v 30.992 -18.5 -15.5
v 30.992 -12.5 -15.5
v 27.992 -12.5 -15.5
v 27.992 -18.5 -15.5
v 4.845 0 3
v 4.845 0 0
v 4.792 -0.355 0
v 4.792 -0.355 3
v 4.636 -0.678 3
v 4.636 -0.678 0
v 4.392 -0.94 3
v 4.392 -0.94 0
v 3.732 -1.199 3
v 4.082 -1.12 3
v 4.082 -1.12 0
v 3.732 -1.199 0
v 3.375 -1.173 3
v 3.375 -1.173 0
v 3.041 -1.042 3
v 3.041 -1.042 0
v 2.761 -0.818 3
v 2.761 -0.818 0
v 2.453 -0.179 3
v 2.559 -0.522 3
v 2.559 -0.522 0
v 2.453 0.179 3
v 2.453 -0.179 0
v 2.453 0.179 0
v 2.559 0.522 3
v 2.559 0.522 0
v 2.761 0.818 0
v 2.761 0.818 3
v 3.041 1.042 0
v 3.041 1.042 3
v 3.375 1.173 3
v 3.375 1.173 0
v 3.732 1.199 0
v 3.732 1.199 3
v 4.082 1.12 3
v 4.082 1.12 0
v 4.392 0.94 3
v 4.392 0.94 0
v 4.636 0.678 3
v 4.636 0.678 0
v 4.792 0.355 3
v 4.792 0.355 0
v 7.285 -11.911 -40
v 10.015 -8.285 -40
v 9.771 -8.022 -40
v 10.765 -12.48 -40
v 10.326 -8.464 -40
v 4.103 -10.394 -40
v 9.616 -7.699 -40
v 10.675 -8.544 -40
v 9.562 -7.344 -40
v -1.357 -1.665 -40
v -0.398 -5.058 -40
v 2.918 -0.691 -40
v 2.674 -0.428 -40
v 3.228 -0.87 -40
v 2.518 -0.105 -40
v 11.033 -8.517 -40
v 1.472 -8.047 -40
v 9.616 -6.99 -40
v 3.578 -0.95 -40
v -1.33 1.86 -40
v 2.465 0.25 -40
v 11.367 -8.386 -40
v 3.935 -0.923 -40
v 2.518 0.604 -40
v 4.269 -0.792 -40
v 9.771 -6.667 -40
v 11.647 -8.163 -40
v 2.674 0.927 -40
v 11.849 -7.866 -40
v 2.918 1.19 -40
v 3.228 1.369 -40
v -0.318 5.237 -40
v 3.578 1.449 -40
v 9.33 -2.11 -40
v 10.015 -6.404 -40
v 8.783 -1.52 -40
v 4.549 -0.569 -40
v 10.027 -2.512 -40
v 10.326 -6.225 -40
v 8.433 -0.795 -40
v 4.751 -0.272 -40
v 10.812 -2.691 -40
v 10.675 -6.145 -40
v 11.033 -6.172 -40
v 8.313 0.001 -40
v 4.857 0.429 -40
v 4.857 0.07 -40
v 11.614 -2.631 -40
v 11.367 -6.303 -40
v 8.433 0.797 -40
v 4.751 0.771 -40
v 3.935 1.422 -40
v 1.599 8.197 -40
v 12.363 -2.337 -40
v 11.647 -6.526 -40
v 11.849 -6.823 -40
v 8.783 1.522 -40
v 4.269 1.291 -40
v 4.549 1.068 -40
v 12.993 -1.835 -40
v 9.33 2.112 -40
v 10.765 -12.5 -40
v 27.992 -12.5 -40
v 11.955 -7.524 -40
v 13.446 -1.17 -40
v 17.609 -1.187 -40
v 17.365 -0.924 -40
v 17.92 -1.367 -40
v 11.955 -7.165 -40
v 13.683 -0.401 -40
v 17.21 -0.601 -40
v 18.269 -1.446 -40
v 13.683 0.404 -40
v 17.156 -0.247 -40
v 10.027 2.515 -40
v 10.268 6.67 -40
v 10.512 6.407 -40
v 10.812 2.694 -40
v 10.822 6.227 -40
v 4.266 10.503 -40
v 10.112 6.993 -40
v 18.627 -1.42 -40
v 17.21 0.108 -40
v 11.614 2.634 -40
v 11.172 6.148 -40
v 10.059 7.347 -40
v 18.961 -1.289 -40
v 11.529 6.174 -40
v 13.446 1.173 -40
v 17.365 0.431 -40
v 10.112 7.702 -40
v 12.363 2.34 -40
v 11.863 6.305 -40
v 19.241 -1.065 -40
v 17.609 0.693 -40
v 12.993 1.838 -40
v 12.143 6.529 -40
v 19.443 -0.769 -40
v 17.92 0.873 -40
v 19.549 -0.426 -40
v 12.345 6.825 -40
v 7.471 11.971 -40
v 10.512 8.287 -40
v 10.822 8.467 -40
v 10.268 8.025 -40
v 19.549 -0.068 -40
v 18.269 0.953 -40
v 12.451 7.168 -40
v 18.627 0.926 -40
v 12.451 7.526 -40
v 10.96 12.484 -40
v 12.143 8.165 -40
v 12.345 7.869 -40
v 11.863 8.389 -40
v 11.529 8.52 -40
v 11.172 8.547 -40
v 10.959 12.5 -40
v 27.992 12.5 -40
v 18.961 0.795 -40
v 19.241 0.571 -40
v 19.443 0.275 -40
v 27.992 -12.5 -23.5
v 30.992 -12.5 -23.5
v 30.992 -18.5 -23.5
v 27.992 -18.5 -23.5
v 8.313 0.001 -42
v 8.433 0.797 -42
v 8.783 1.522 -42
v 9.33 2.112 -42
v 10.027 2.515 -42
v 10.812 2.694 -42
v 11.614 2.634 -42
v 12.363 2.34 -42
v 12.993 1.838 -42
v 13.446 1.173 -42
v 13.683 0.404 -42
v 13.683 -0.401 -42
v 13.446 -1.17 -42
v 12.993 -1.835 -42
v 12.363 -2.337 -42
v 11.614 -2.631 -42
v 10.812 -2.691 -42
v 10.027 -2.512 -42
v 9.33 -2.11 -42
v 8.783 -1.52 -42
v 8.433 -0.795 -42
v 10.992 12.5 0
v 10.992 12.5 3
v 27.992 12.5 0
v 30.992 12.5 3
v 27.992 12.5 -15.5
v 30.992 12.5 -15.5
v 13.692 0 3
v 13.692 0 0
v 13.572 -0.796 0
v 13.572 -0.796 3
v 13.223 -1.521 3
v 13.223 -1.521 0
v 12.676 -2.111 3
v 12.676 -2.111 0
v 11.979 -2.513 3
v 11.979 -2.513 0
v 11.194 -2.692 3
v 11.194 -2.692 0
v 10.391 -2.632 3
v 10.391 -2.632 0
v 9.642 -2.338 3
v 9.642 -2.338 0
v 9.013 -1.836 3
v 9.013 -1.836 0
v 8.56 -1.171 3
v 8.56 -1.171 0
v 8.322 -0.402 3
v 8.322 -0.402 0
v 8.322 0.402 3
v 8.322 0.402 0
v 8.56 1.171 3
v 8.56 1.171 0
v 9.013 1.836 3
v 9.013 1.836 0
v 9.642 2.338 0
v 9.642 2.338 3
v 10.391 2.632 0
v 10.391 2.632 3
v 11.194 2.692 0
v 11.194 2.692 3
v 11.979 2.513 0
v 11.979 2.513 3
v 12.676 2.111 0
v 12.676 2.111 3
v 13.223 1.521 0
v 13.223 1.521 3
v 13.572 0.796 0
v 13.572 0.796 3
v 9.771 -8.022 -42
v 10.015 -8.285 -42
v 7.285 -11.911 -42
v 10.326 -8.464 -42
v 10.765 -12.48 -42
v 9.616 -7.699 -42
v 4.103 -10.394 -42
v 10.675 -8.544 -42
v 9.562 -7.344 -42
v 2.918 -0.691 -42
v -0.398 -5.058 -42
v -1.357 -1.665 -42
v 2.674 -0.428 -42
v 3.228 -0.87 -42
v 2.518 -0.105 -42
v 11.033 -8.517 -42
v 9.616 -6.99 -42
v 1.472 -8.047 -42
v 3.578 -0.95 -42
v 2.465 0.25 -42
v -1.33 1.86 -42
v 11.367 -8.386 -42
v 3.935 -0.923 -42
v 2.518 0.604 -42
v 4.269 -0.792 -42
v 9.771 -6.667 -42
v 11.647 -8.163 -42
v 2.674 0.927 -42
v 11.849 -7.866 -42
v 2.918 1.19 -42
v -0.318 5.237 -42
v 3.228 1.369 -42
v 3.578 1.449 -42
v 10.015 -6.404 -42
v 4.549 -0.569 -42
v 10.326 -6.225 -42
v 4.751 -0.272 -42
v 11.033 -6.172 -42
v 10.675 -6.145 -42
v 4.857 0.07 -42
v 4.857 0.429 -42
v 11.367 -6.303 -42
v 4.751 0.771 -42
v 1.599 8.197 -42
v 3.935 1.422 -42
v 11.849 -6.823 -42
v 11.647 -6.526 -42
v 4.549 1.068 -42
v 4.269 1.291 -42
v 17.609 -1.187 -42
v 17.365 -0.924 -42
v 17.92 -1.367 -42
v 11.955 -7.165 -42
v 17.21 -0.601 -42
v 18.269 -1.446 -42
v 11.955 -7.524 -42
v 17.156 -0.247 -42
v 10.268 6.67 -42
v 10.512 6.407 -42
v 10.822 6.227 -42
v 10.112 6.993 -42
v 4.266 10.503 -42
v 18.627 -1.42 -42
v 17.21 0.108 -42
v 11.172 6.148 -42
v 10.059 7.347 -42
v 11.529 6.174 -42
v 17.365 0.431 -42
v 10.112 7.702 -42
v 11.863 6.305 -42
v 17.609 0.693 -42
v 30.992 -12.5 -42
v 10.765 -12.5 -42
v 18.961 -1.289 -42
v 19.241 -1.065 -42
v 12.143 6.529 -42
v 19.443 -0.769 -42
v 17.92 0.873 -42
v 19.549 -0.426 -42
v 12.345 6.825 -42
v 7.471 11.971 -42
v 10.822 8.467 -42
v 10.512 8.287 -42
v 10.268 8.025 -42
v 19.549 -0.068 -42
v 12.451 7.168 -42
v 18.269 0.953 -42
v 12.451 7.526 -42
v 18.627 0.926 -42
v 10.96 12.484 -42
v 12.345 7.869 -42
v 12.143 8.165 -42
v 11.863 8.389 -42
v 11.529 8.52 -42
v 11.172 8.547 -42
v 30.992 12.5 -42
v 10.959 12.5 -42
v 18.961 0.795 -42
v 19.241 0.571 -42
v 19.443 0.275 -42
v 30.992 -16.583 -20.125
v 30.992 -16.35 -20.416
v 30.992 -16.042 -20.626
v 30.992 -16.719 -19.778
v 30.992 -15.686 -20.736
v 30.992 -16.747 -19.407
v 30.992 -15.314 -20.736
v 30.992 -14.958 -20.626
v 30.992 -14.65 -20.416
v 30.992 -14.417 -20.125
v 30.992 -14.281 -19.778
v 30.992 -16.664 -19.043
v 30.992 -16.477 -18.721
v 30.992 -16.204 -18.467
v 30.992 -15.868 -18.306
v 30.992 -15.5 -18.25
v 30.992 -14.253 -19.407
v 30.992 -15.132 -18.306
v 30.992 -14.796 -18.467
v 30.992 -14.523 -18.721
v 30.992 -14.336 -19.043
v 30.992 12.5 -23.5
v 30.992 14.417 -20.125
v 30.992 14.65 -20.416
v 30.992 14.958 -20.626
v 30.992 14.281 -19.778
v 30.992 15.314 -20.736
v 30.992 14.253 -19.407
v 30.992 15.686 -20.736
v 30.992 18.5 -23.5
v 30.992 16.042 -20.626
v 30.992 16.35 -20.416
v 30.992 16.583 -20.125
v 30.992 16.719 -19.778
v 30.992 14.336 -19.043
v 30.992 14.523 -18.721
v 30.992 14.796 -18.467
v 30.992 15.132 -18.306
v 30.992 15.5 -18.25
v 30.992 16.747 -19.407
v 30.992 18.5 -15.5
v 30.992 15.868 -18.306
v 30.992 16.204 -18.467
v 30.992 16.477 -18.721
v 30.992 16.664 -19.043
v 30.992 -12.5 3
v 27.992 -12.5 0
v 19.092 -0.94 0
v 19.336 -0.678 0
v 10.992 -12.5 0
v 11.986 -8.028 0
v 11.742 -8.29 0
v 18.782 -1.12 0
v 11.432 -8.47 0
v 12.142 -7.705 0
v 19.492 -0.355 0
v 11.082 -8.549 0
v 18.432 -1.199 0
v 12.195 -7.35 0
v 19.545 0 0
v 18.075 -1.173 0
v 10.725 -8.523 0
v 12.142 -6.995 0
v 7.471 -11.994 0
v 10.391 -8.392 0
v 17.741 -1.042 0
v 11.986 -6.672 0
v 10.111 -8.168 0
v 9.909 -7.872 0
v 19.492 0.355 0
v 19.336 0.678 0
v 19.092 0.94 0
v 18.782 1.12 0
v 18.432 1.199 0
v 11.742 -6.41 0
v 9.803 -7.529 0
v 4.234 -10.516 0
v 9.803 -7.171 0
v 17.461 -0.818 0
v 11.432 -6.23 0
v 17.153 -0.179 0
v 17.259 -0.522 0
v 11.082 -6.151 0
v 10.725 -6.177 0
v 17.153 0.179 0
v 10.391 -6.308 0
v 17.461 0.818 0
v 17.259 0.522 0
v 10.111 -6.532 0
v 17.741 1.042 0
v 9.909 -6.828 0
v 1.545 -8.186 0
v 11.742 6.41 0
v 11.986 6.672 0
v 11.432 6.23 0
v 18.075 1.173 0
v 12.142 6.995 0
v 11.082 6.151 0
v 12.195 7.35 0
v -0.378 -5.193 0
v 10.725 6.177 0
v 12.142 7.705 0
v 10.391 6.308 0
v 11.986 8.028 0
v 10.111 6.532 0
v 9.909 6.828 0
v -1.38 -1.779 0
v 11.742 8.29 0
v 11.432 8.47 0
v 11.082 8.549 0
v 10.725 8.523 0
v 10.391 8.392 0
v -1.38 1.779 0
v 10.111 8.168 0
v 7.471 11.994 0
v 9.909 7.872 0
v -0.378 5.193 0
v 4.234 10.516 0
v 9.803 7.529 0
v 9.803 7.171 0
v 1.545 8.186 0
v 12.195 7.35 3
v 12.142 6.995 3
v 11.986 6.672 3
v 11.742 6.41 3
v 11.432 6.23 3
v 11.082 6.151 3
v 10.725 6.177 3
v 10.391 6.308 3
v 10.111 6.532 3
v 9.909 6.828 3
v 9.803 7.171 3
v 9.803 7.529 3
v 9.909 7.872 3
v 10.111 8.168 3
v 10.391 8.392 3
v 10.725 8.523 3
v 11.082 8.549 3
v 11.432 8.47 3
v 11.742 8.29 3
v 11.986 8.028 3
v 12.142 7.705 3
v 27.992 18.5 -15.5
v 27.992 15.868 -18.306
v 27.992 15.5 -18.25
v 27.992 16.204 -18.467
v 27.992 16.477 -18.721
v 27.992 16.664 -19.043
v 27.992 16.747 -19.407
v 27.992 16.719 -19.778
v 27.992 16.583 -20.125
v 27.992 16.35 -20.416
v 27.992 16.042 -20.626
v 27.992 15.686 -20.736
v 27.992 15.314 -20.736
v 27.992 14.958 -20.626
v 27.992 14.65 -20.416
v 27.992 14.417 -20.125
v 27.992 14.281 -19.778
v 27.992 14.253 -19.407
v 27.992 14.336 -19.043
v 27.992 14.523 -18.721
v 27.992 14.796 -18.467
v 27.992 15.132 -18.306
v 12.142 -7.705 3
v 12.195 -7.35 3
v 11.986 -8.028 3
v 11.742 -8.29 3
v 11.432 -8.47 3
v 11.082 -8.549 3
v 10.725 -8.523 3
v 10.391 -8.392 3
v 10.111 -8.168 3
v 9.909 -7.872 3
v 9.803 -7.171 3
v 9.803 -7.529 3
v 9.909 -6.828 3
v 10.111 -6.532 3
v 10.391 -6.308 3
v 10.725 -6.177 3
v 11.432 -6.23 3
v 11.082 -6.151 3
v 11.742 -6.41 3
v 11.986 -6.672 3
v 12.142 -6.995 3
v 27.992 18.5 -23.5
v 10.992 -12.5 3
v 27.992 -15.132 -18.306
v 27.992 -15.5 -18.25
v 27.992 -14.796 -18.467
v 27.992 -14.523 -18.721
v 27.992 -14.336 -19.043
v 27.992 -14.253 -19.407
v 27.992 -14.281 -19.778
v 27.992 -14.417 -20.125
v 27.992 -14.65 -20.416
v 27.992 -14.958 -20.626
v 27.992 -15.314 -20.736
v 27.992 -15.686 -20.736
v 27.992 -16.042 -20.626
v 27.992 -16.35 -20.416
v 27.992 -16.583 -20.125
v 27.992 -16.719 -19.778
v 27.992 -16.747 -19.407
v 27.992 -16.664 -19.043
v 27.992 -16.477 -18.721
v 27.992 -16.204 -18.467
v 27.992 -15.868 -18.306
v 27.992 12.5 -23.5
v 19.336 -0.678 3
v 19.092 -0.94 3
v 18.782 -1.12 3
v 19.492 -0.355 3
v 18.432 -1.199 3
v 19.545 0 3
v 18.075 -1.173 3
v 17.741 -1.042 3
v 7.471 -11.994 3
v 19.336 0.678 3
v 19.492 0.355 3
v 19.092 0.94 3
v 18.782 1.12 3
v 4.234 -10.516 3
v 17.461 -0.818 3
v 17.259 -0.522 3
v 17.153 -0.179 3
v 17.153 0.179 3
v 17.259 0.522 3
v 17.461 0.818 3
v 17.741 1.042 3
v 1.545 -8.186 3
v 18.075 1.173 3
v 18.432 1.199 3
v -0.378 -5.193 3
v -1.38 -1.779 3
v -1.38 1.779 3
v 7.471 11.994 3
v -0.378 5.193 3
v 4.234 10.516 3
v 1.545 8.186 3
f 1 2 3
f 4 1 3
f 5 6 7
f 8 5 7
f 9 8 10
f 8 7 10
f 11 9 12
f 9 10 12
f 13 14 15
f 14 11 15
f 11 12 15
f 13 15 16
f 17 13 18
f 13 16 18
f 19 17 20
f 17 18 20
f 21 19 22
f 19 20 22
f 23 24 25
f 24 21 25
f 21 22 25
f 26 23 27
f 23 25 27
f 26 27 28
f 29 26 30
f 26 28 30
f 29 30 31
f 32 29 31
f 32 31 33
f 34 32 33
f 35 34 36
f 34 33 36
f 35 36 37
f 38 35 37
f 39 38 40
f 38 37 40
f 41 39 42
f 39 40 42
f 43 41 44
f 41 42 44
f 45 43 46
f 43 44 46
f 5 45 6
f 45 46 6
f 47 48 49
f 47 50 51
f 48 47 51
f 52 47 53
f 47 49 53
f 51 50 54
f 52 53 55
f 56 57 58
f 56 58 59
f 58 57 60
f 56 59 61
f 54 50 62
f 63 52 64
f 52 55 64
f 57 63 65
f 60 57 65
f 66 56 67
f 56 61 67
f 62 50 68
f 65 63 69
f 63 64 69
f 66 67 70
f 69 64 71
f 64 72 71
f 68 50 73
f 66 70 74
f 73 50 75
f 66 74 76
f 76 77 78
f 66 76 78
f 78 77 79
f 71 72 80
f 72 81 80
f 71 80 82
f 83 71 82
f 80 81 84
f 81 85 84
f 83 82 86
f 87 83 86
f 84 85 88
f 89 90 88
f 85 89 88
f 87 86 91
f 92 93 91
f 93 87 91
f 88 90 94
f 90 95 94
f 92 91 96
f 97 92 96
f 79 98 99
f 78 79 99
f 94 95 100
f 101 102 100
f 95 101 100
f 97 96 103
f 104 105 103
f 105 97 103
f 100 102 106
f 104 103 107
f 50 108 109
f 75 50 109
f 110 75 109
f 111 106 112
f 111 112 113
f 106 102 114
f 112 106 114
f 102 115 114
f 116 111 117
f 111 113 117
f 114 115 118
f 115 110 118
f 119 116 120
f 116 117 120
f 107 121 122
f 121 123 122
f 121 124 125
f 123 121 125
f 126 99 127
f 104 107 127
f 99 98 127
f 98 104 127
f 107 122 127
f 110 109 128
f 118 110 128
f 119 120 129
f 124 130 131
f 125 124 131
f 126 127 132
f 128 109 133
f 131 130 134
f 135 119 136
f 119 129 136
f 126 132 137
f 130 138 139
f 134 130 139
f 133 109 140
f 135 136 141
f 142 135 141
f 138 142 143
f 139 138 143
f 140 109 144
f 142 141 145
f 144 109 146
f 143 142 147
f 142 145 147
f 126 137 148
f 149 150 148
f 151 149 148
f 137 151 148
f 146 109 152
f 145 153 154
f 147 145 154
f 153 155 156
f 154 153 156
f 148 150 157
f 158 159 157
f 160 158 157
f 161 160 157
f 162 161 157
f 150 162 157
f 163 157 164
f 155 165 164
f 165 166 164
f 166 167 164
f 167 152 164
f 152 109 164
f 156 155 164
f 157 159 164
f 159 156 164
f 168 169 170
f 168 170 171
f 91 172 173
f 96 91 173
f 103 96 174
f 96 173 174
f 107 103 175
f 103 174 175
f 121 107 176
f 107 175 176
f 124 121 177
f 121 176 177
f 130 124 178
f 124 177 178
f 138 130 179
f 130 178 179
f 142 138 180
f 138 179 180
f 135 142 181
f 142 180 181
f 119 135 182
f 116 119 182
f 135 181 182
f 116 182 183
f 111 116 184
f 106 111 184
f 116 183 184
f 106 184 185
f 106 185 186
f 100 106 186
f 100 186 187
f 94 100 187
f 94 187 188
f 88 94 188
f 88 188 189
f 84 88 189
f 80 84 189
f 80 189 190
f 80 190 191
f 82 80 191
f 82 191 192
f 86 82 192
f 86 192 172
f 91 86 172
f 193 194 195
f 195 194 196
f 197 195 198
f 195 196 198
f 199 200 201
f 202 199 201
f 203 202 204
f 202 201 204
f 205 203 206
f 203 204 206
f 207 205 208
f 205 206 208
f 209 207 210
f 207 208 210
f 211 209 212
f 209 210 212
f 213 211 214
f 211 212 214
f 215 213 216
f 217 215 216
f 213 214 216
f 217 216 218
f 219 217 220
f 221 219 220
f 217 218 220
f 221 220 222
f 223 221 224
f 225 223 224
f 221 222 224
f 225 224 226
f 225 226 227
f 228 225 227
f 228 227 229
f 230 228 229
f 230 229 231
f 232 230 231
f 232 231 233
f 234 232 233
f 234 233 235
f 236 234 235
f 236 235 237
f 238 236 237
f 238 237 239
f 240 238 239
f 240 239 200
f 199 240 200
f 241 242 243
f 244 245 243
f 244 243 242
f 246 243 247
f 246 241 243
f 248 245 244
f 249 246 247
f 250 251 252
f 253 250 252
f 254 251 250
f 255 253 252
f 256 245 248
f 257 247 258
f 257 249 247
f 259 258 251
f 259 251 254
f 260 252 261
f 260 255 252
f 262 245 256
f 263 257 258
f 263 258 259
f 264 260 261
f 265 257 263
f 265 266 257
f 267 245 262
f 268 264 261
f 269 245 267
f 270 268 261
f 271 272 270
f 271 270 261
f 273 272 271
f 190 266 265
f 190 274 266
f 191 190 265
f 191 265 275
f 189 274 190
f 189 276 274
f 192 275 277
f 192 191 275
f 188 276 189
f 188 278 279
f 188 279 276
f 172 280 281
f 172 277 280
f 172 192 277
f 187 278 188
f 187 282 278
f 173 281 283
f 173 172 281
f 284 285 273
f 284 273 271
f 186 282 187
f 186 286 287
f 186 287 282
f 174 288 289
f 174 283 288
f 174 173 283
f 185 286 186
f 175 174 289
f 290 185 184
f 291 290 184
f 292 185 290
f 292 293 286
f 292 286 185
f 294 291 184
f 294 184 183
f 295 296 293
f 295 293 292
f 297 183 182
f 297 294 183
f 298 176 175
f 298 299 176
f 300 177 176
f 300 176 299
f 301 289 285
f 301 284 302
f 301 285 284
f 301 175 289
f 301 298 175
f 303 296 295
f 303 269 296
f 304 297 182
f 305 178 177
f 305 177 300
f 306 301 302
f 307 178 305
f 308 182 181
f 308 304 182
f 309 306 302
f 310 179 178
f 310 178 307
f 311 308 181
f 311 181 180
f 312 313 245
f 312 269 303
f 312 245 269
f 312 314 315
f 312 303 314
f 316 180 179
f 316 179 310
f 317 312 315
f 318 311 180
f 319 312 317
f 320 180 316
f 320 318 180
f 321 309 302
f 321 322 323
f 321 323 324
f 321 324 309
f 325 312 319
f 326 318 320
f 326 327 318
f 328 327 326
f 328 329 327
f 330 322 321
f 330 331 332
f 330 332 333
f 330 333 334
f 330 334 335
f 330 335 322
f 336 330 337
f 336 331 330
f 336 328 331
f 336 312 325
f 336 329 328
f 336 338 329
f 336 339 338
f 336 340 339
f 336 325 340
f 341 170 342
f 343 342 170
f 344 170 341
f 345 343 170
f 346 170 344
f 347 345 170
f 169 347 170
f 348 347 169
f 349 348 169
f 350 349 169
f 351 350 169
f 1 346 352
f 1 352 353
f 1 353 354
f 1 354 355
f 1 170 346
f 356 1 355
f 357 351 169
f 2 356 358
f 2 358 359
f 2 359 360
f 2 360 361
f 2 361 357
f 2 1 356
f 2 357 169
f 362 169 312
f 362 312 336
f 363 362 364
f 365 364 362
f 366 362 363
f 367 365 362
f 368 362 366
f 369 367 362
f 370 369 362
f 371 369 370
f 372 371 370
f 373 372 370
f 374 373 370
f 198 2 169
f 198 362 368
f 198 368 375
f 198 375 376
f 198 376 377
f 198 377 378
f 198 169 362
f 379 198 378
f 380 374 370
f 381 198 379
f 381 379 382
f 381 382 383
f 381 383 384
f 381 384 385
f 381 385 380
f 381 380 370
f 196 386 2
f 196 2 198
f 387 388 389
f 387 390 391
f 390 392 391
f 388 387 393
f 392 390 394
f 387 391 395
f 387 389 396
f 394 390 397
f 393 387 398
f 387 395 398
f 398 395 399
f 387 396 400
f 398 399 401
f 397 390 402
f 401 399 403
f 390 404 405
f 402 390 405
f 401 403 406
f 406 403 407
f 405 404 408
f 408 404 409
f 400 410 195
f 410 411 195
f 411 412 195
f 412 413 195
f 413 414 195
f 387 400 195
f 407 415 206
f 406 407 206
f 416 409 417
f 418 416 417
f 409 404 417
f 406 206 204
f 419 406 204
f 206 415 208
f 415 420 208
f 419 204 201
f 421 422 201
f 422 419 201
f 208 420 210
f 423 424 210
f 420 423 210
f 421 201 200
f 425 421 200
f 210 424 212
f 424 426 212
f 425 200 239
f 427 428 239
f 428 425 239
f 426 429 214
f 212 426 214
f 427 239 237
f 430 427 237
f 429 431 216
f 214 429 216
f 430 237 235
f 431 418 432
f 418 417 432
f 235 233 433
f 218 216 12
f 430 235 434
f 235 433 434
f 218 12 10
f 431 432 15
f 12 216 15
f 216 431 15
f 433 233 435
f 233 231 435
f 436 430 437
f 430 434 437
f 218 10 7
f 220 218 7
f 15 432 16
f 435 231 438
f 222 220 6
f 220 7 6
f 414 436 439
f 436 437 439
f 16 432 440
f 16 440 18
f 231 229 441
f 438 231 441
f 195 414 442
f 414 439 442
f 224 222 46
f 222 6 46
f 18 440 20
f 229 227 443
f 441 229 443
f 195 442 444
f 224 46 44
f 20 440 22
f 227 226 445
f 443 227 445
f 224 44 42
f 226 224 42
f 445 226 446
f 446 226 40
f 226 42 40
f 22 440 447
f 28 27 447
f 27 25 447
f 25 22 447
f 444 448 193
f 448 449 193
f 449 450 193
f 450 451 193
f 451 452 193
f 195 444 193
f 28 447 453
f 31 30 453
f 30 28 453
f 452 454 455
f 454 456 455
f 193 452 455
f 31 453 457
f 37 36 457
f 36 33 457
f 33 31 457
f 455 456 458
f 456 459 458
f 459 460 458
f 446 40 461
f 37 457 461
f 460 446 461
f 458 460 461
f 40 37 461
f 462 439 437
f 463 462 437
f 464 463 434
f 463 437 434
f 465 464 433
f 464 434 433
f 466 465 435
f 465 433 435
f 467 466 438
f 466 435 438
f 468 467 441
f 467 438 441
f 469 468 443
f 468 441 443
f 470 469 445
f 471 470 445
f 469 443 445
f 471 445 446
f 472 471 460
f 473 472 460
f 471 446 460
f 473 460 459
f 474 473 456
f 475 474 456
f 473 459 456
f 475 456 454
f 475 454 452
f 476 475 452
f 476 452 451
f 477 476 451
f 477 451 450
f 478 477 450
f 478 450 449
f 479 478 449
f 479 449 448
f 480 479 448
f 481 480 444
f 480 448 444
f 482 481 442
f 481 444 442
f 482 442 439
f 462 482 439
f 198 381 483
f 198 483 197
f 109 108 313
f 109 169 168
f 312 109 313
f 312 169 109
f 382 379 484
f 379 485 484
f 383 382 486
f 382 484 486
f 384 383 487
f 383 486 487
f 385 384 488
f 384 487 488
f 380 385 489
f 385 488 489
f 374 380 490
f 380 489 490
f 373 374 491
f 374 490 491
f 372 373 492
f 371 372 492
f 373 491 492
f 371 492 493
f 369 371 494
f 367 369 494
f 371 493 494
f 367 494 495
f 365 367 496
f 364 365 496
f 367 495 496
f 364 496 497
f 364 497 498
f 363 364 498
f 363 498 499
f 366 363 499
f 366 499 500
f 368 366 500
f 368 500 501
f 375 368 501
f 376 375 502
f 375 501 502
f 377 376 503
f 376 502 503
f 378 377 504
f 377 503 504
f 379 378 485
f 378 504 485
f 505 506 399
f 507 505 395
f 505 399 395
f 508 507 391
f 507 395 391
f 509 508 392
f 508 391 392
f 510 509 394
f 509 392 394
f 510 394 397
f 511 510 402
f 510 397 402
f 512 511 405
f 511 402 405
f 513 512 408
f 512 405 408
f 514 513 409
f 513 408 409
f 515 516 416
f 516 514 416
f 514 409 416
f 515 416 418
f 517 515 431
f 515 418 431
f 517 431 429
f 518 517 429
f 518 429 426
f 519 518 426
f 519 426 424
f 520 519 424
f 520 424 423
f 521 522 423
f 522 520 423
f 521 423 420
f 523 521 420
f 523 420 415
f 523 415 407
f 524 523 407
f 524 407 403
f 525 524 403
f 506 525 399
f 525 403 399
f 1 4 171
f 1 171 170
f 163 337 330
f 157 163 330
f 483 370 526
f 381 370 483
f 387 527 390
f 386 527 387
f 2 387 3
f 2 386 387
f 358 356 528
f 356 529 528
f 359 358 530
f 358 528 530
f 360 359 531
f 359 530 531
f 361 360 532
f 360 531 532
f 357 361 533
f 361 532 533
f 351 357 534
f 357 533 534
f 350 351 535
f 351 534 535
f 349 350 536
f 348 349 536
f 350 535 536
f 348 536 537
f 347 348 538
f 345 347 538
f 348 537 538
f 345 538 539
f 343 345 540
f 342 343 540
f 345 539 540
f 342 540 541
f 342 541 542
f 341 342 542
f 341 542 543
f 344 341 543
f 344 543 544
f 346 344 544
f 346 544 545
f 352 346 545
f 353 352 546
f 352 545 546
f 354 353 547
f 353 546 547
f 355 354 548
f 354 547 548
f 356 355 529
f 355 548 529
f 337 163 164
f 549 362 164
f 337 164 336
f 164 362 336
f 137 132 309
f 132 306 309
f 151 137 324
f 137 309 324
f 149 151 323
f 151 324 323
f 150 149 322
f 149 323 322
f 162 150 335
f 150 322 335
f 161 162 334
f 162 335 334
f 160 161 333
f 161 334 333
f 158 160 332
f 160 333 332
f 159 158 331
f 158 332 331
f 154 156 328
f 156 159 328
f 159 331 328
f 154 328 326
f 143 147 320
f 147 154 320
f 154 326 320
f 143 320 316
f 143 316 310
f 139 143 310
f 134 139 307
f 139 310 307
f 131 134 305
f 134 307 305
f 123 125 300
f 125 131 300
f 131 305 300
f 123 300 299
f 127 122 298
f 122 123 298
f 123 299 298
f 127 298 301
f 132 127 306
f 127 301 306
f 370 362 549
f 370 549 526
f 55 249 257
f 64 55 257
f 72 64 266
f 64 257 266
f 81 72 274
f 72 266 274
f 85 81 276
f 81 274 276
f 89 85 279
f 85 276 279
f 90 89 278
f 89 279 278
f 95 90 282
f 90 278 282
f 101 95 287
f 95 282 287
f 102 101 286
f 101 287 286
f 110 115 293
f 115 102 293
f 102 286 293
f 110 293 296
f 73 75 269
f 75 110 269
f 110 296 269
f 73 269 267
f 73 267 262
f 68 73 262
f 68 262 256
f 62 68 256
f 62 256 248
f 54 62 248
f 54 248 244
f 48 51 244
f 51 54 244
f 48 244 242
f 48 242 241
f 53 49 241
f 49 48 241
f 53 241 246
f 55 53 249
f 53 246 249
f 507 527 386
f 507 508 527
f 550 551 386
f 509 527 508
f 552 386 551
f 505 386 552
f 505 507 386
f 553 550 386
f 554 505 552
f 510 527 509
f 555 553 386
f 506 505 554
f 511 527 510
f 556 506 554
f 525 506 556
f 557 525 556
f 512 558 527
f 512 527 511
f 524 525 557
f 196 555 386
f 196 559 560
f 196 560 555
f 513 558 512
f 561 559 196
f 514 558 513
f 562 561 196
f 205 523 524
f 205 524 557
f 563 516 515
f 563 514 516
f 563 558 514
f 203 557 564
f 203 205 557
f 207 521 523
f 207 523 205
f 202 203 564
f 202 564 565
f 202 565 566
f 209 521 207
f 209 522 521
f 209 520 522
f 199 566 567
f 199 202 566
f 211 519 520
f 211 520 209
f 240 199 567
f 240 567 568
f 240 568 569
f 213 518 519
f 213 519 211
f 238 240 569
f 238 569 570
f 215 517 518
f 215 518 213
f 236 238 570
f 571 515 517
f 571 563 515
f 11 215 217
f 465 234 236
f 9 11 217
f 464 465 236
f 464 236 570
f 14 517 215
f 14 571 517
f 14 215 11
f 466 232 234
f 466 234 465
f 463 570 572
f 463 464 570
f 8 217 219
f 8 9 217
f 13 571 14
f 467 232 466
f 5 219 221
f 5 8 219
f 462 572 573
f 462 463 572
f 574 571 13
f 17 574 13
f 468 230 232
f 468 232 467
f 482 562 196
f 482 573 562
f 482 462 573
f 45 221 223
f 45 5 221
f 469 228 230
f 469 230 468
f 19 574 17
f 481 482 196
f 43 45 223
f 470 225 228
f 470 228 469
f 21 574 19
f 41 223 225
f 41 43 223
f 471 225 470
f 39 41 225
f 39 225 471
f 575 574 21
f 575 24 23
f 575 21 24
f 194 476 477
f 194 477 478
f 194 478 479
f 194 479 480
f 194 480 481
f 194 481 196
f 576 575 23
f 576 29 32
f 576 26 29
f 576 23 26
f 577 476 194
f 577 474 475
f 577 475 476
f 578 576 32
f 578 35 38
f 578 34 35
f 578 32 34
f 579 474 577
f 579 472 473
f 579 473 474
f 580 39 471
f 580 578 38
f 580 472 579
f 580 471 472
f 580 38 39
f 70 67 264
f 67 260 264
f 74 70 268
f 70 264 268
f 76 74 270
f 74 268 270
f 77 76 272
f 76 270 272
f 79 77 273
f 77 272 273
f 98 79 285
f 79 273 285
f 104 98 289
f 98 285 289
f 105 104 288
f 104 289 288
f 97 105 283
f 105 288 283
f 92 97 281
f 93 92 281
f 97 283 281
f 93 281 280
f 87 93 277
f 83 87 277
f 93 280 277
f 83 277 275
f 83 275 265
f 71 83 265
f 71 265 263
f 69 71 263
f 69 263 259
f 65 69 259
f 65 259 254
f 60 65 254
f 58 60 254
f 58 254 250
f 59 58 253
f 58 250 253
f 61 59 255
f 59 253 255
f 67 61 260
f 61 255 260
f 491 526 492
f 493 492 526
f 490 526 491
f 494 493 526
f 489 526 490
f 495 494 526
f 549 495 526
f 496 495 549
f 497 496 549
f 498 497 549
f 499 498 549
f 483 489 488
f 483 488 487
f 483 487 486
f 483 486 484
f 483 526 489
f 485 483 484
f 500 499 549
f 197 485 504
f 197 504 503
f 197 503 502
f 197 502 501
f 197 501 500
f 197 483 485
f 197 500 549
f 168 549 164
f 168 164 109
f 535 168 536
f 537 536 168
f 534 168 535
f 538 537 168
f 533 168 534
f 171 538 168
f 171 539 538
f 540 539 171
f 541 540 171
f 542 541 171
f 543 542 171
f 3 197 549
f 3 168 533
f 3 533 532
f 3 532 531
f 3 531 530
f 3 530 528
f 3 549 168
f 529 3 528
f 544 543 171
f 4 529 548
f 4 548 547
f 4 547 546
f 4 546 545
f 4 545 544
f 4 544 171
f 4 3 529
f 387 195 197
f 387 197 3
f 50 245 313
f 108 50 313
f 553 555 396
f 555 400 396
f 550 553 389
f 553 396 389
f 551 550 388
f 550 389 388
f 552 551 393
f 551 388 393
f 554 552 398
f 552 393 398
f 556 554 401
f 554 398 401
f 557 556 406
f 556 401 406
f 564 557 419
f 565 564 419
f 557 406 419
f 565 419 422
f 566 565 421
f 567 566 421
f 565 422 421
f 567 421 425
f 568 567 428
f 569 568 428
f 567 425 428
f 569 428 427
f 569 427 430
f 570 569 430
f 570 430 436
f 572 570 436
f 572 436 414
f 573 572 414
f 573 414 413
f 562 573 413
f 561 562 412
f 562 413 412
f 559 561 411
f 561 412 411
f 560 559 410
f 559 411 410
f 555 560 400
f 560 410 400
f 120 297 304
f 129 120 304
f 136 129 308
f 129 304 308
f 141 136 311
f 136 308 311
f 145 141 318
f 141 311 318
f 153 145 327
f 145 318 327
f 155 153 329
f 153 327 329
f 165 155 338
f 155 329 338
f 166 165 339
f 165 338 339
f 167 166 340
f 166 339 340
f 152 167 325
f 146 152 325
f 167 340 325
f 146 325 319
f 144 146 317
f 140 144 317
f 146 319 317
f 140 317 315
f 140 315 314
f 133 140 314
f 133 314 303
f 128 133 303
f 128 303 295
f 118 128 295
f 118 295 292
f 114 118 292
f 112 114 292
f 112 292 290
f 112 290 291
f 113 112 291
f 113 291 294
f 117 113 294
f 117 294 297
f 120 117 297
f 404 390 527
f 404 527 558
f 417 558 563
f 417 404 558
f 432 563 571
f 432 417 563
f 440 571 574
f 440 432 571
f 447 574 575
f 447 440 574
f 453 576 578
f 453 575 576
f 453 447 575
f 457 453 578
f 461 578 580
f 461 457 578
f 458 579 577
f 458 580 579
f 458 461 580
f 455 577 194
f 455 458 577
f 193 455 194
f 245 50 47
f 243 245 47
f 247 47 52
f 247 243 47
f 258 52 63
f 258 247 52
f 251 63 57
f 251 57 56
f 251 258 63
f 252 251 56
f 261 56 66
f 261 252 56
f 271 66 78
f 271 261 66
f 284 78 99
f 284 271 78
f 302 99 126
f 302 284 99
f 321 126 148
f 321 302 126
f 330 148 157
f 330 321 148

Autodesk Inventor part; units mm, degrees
ref_plane "YZ Plane" through (0, 0, 0) normal (1, 0, 0) x (0, 1, 0)
ref_plane "XZ Plane" through (0, 0, 0) normal (0, 1, 0) x (-1, 0, 0)
ref_plane "XY Plane" through (0, 0, 0) normal (0, 0, 1) x (1, 0, 0)
ref_plane "Plano de trabajo1" through (0, 0, 0) normal (0, 0, 1) x (1, 0, 0)
sketch "Boceto1" plane through (0, 0, 0) normal (0, 0, 1) x (1, 0, 0)
  circle A0 centre (18.3423, 0) radius 1.2028 projected
  circle A1 centre (3.6423, 0) radius 1.2028 projected
  circle A2 centre (10.9923, -7.35) radius 1.2028 projected
  circle A3 centre (10.9923, 7.35) radius 1.2028 projected
  circle A4 centre (10.9923, 0) radius 10.9823 projected
  circle A5 centre (10.9923, 0) radius 2.7 projected
  circle A6 centre (10.9923, 0) radius 12.5
  line L0 (10.9923, 0) -> (22.9923, 0)
  line L1 (10.9923, 0) -> (10.9923, 12.5)
  line L2 (10.9923, 12.5) -> (22.9923, 12.5)
  line L3 (10.9923, 0) -> (10.9923, -12.5)
  line L4 (10.9923, -12.5) -> (22.9923, -12.5)
  line L5 (22.9923, -12.5) -> (22.9923, 12.5)
  point P0 (0, 0)
  dimension "d0" = 25
  dimension "d1" = 12
  dimension "d2" = 12
extrude "Extrusión1" add sketch "Boceto1" along normal blind 3 contours L0 A4 L3 A2 A5 A0 | A0 L0 A5 L1 A3 A4 | L0 L5 A6 L3 A4 | A4 L1 A6 L5 L0 | L1 A3 A5 L3 A2 A4 | A4 L3 A6 L1 | L2 L5 A6 | A6 L5 L4
sketch "Boceto2" plane through (22.9923, -12.5, 0) normal (1, 0, 0) x (0, 0, -1)
  line L0 (0, 0) -> (0, 25) projected
  line L1 (0, 25) -> (-3, 25) projected
  line L2 (-3, 0) -> (-3, 25) projected
  line L3 (0, 0) -> (-3, 0) projected
  point P0 (0, 12.5)
extrude "Extrusión2" add sketch "Boceto2" along normal blind 8
sketch "Boceto3" plane through (0, 0, 0) normal (0, 0, -1) x (-1, 0, 0)
  line L0 (-10.9923, -12.5) -> (-30.9923, -12.5) projected
  arc A0 (-10.9923, -12.5) -> (-10.9923, 12.5) centre (-10.9923, 0) ccw projected
  line L1 (-10.9923, 12.5) -> (-30.9923, 12.5) projected
  line L2 (-30.9923, -12.5) -> (-30.9923, 12.5) projected
  circle A1 centre (-10.9923, 0) radius 2.7 projected
  circle A2 centre (-10.9923, 7.35) radius 1.2028 projected
  circle A3 centre (-18.3423, 0) radius 1.2028 projected
  circle A4 centre (-3.6423, 0) radius 1.2028 projected
  circle A5 centre (-10.9923, -7.35) radius 1.2028 projected
  line L3 (-30.9923, 12.5) -> (-27.9923, 12.5)
  line L4 (-27.9923, 12.5) -> (-27.9923, -12.5)
  line L5 (-27.9923, -12.5) -> (-30.9923, -12.5)
  line L6 (-30.9923, -12.5) -> (-30.9923, 12.5)
  point P0 (0, 0)
  dimension "d7" = 3
extrude "Extrusión3" add sketch "Boceto3" along normal blind 42 contours L0 L2 L1 L4
sketch "Boceto4" plane through (27.9923, -12.5, 0) normal (-1, 0, 0) x (0, 0, 1)
  line L0 (-42, 0) -> (-42, 25) projected
  line L1 (0, 25) -> (0, 0) projected
  line L2 (0, 25) -> (-42, 25) projected
  line L3 (-42, 0) -> (-42, 25) projected
  line L4 (0, 0) -> (-42, 0) projected
  line L5 (-42, 0) -> (-40, 0)
  line L6 (-40, 0) -> (-40, 25)
  line L7 (-40, 25) -> (-42, 25)
  line L8 (-42, 25) -> (-42, 0)
  point P0 (0, 12.5)
  dimension "d10" = 2
extrude "Extrusión4" add sketch "Boceto4" along normal blind 30 contours L0 L2 L6 L4
sketch "Boceto5" plane through (0, 0, -42) normal (0, 0, -1) x (-1, 0, 0)
  line L0 (24.4501, 12.6367) -> (24.5578, -12.3277) projected
  line L1 (-11.0672, 12.4835) -> (24.4501, 12.6367) projected
  arc A0 (-11.0672, 12.4835) -> (-10.9596, -12.4809) centre (-11.0134, 0.0013) ccw projected
  line L2 (-10.9596, -12.4809) -> (24.5578, -12.3277) projected
  circle A1 centre (-3.6676, 0.2495) radius 1.2028 projected
  circle A2 centre (-11.0134, 0.0013) radius 2.7 projected
  circle A3 centre (-10.7652, -7.3445) radius 1.2028 projected
  circle A4 centre (-11.2616, 7.3471) radius 1.2028 projected
  circle A5 centre (-18.3592, -0.2469) radius 1.2028 projected
  line L3 (-30.9923, 12.5) -> (2.0077, 12.5) projected
  line L4 (-11.0672, 12.4835) -> (2.0077, 12.5)
  line L5 (2.0391, -12.4248) -> (2.0077, 12.5)
  line L6 (-10.9596, -12.4809) -> (2.0391, -12.4248)
  line L7 (-11.0672, 12.4835) -> (2.0077, 12.5)
  circle A6 centre (-11.0134, 0.0013) radius 12.4823
  line L8 (-10.7652, -7.3445) -> (-10.7652, -14.8497)
  line L9 (-10.7652, -14.8497) -> (6.2045, -14.8497)
  line L10 (6.2045, -14.8497) -> (6.2045, 15.7882)
  line L11 (6.2045, 15.7882) -> (-10.7652, 15.7882)
  line L12 (-10.7652, 15.7882) -> (-11.2616, 7.3471)
  point P0 (0, 0)
  point P1 (-7.2489, 12.5)
  point P2 (-10.991, 12.4836)
  point P3 (-10.9817, -12.481)
  point P4 (-10.9586, 12.5)
  point P5 (6.2045, 12.558)
  point P6 (6.2045, -12.4069)
  point P7 (-10.7652, -12.48)
  point P8 (-10.9595, 12.484)
  point P9 (-10.9595, 12.4837)
  point P10 (-10.9596, 12.4835)
  point P11 (-10.991, 12.4836)
  point P12 (-10.7652, -12.4785)
  point P13 (-11.0672, 12.4835)
extrude "Extrusión5" cut sketch "Boceto5" against normal blind 25 contours L10 L2 L5 L3 L1 | L1 L3 L12 L11 L10 | L10 L9 L8 L2 | L3 L4 L1 | L1 L12 L3 | L2 A6 L4 L5 | A3 | A4 | A1 | A2 | A5
sketch "Boceto8" plane through (10.9923, -12.5, 0) normal (0, -1, 0) x (1, 0, 0)
  line L0 (-0.2271, -40) -> (-0.2271, -42) projected
  line L1 (20, -42) -> (-0.2271, -42) projected
  line L2 (20, 3) -> (20, -42) projected
  line L3 (0, 3) -> (20, 3) projected
  line L4 (0, 0) -> (0, 3) projected
  line L5 (0, 0) -> (17, 0) projected
  line L6 (17, 0) -> (17, -40) projected
  line L7 (17, -40) -> (-0.2271, -40) projected
  line L8 (20, -42) -> (20, -19.5)
  line L9 (20, 3) -> (20, -42) projected
  line L10 (20, -19.5) -> (20, -23.5)
  line L11 (20, -23.5) -> (20, -15.5)
  line L12 (20, -15.5) -> (17, -15.5)
  line L13 (20, -23.5) -> (17, -23.5)
  point P0 (-10.9923, 0)
  dimension "d29" = 22.5
  dimension "d30" = 4
  dimension "d31" = 8
extrude "Extrusión8" add sketch "Boceto8" along normal blind 6 contours L6 L12 L2 L13
ref_plane "Plano de trabajo2" through (-0.8313, -11.6464, -27.56) normal (0.0048, -1, 0) x (1, 0.0048, 0)
sketch "Boceto9" plane through (30.9923, -12.5, 0) normal (1, 0, 0) x (0, 0, -1)
  line L0 (-3, 25) -> (42, 25) projected
  line L1 (-3, 25) -> (-3, 0) projected
  line L2 (-3, 0) -> (15.5, 0) projected
  line L3 (15.5, 0) -> (15.5, -6) projected
  line L4 (23.5, -6) -> (15.5, -6) projected
  line L5 (23.5, 0) -> (23.5, -6) projected
  line L6 (23.5, 0) -> (42, 0) projected
  line L7 (42, 25) -> (42, 0) projected
  line L8 (23.5, 0) -> (23.5, 25)
  line L9 (23.5, 25) -> (23.5, 31)
  line L10 (23.5, 31) -> (15.5, 31)
  line L11 (15.5, 31) -> (15.5, 25)
  point P0 (0, 12.5)
  dimension "d34" = 6
extrude "Extrusión9" add sketch "Boceto9" against normal blind 3 contours L11 L10 L9 L0
sketch "Boceto10" plane through (27.9923, -12.5, 0) normal (-1, 0, 0) x (0, 0, 1)
  line L0 (-40, 25) -> (-40, 0) projected
  line L1 (-23.5, 0) -> (-40, 0) projected
  line L2 (-23.5, 0) -> (-23.5, -6) projected
  line L3 (-15.5, -6) -> (-23.5, -6) projected
  line L4 (-15.5, 0) -> (-15.5, -6) projected
  line L5 (0, 0) -> (-15.5, 0) projected
  line L6 (0, 25) -> (0, 0) projected
  line L7 (0, 25) -> (-15.5, 25) projected
  line L8 (-15.5, 25) -> (-15.5, 31) projected
  line L9 (-15.5, 31) -> (-23.5, 31) projected
  line L10 (-23.5, 31) -> (-23.5, 25) projected
  line L11 (-23.5, 25) -> (-40, 25) projected
  line L12 (-15.5, -3) -> (-19.5, -3)
  line L13 (-19.5, -3) -> (-19.5, 28)
  circle A0 centre (-19.5, -3) radius 1.25
  circle A1 centre (-19.5, 28) radius 1.25
  point P0 (0, 12.5)
  dimension "d37" = 2.5
  dimension "d38" = 2.5
extrude "Extrusión10" cut sketch "Boceto10" against normal blind 3 contours A1 | A0 L13 L12 | L12 L13 A0
sketch "Boceto11" plane through (27.9923, -12.5, 0) normal (-1, 0, 0) x (0, 0, 1)
  line L0 (-42, 25) -> (-42, 0) projected
  line L1 (-42, 25) -> (-42, 12.5)
  line L2 (-42, 12.5) -> (-19.5, 12.5)
  line L3 (3, 13.7028) -> (3, 11.2972) projected
  line L4 (-19.5, 12.5) -> (-19.5, 25)
  point P0 (0, 12.5)
  dimension "d41" = 12.5
  dimension "d42" = 22.5
properties part number "UnionCuerpo"
